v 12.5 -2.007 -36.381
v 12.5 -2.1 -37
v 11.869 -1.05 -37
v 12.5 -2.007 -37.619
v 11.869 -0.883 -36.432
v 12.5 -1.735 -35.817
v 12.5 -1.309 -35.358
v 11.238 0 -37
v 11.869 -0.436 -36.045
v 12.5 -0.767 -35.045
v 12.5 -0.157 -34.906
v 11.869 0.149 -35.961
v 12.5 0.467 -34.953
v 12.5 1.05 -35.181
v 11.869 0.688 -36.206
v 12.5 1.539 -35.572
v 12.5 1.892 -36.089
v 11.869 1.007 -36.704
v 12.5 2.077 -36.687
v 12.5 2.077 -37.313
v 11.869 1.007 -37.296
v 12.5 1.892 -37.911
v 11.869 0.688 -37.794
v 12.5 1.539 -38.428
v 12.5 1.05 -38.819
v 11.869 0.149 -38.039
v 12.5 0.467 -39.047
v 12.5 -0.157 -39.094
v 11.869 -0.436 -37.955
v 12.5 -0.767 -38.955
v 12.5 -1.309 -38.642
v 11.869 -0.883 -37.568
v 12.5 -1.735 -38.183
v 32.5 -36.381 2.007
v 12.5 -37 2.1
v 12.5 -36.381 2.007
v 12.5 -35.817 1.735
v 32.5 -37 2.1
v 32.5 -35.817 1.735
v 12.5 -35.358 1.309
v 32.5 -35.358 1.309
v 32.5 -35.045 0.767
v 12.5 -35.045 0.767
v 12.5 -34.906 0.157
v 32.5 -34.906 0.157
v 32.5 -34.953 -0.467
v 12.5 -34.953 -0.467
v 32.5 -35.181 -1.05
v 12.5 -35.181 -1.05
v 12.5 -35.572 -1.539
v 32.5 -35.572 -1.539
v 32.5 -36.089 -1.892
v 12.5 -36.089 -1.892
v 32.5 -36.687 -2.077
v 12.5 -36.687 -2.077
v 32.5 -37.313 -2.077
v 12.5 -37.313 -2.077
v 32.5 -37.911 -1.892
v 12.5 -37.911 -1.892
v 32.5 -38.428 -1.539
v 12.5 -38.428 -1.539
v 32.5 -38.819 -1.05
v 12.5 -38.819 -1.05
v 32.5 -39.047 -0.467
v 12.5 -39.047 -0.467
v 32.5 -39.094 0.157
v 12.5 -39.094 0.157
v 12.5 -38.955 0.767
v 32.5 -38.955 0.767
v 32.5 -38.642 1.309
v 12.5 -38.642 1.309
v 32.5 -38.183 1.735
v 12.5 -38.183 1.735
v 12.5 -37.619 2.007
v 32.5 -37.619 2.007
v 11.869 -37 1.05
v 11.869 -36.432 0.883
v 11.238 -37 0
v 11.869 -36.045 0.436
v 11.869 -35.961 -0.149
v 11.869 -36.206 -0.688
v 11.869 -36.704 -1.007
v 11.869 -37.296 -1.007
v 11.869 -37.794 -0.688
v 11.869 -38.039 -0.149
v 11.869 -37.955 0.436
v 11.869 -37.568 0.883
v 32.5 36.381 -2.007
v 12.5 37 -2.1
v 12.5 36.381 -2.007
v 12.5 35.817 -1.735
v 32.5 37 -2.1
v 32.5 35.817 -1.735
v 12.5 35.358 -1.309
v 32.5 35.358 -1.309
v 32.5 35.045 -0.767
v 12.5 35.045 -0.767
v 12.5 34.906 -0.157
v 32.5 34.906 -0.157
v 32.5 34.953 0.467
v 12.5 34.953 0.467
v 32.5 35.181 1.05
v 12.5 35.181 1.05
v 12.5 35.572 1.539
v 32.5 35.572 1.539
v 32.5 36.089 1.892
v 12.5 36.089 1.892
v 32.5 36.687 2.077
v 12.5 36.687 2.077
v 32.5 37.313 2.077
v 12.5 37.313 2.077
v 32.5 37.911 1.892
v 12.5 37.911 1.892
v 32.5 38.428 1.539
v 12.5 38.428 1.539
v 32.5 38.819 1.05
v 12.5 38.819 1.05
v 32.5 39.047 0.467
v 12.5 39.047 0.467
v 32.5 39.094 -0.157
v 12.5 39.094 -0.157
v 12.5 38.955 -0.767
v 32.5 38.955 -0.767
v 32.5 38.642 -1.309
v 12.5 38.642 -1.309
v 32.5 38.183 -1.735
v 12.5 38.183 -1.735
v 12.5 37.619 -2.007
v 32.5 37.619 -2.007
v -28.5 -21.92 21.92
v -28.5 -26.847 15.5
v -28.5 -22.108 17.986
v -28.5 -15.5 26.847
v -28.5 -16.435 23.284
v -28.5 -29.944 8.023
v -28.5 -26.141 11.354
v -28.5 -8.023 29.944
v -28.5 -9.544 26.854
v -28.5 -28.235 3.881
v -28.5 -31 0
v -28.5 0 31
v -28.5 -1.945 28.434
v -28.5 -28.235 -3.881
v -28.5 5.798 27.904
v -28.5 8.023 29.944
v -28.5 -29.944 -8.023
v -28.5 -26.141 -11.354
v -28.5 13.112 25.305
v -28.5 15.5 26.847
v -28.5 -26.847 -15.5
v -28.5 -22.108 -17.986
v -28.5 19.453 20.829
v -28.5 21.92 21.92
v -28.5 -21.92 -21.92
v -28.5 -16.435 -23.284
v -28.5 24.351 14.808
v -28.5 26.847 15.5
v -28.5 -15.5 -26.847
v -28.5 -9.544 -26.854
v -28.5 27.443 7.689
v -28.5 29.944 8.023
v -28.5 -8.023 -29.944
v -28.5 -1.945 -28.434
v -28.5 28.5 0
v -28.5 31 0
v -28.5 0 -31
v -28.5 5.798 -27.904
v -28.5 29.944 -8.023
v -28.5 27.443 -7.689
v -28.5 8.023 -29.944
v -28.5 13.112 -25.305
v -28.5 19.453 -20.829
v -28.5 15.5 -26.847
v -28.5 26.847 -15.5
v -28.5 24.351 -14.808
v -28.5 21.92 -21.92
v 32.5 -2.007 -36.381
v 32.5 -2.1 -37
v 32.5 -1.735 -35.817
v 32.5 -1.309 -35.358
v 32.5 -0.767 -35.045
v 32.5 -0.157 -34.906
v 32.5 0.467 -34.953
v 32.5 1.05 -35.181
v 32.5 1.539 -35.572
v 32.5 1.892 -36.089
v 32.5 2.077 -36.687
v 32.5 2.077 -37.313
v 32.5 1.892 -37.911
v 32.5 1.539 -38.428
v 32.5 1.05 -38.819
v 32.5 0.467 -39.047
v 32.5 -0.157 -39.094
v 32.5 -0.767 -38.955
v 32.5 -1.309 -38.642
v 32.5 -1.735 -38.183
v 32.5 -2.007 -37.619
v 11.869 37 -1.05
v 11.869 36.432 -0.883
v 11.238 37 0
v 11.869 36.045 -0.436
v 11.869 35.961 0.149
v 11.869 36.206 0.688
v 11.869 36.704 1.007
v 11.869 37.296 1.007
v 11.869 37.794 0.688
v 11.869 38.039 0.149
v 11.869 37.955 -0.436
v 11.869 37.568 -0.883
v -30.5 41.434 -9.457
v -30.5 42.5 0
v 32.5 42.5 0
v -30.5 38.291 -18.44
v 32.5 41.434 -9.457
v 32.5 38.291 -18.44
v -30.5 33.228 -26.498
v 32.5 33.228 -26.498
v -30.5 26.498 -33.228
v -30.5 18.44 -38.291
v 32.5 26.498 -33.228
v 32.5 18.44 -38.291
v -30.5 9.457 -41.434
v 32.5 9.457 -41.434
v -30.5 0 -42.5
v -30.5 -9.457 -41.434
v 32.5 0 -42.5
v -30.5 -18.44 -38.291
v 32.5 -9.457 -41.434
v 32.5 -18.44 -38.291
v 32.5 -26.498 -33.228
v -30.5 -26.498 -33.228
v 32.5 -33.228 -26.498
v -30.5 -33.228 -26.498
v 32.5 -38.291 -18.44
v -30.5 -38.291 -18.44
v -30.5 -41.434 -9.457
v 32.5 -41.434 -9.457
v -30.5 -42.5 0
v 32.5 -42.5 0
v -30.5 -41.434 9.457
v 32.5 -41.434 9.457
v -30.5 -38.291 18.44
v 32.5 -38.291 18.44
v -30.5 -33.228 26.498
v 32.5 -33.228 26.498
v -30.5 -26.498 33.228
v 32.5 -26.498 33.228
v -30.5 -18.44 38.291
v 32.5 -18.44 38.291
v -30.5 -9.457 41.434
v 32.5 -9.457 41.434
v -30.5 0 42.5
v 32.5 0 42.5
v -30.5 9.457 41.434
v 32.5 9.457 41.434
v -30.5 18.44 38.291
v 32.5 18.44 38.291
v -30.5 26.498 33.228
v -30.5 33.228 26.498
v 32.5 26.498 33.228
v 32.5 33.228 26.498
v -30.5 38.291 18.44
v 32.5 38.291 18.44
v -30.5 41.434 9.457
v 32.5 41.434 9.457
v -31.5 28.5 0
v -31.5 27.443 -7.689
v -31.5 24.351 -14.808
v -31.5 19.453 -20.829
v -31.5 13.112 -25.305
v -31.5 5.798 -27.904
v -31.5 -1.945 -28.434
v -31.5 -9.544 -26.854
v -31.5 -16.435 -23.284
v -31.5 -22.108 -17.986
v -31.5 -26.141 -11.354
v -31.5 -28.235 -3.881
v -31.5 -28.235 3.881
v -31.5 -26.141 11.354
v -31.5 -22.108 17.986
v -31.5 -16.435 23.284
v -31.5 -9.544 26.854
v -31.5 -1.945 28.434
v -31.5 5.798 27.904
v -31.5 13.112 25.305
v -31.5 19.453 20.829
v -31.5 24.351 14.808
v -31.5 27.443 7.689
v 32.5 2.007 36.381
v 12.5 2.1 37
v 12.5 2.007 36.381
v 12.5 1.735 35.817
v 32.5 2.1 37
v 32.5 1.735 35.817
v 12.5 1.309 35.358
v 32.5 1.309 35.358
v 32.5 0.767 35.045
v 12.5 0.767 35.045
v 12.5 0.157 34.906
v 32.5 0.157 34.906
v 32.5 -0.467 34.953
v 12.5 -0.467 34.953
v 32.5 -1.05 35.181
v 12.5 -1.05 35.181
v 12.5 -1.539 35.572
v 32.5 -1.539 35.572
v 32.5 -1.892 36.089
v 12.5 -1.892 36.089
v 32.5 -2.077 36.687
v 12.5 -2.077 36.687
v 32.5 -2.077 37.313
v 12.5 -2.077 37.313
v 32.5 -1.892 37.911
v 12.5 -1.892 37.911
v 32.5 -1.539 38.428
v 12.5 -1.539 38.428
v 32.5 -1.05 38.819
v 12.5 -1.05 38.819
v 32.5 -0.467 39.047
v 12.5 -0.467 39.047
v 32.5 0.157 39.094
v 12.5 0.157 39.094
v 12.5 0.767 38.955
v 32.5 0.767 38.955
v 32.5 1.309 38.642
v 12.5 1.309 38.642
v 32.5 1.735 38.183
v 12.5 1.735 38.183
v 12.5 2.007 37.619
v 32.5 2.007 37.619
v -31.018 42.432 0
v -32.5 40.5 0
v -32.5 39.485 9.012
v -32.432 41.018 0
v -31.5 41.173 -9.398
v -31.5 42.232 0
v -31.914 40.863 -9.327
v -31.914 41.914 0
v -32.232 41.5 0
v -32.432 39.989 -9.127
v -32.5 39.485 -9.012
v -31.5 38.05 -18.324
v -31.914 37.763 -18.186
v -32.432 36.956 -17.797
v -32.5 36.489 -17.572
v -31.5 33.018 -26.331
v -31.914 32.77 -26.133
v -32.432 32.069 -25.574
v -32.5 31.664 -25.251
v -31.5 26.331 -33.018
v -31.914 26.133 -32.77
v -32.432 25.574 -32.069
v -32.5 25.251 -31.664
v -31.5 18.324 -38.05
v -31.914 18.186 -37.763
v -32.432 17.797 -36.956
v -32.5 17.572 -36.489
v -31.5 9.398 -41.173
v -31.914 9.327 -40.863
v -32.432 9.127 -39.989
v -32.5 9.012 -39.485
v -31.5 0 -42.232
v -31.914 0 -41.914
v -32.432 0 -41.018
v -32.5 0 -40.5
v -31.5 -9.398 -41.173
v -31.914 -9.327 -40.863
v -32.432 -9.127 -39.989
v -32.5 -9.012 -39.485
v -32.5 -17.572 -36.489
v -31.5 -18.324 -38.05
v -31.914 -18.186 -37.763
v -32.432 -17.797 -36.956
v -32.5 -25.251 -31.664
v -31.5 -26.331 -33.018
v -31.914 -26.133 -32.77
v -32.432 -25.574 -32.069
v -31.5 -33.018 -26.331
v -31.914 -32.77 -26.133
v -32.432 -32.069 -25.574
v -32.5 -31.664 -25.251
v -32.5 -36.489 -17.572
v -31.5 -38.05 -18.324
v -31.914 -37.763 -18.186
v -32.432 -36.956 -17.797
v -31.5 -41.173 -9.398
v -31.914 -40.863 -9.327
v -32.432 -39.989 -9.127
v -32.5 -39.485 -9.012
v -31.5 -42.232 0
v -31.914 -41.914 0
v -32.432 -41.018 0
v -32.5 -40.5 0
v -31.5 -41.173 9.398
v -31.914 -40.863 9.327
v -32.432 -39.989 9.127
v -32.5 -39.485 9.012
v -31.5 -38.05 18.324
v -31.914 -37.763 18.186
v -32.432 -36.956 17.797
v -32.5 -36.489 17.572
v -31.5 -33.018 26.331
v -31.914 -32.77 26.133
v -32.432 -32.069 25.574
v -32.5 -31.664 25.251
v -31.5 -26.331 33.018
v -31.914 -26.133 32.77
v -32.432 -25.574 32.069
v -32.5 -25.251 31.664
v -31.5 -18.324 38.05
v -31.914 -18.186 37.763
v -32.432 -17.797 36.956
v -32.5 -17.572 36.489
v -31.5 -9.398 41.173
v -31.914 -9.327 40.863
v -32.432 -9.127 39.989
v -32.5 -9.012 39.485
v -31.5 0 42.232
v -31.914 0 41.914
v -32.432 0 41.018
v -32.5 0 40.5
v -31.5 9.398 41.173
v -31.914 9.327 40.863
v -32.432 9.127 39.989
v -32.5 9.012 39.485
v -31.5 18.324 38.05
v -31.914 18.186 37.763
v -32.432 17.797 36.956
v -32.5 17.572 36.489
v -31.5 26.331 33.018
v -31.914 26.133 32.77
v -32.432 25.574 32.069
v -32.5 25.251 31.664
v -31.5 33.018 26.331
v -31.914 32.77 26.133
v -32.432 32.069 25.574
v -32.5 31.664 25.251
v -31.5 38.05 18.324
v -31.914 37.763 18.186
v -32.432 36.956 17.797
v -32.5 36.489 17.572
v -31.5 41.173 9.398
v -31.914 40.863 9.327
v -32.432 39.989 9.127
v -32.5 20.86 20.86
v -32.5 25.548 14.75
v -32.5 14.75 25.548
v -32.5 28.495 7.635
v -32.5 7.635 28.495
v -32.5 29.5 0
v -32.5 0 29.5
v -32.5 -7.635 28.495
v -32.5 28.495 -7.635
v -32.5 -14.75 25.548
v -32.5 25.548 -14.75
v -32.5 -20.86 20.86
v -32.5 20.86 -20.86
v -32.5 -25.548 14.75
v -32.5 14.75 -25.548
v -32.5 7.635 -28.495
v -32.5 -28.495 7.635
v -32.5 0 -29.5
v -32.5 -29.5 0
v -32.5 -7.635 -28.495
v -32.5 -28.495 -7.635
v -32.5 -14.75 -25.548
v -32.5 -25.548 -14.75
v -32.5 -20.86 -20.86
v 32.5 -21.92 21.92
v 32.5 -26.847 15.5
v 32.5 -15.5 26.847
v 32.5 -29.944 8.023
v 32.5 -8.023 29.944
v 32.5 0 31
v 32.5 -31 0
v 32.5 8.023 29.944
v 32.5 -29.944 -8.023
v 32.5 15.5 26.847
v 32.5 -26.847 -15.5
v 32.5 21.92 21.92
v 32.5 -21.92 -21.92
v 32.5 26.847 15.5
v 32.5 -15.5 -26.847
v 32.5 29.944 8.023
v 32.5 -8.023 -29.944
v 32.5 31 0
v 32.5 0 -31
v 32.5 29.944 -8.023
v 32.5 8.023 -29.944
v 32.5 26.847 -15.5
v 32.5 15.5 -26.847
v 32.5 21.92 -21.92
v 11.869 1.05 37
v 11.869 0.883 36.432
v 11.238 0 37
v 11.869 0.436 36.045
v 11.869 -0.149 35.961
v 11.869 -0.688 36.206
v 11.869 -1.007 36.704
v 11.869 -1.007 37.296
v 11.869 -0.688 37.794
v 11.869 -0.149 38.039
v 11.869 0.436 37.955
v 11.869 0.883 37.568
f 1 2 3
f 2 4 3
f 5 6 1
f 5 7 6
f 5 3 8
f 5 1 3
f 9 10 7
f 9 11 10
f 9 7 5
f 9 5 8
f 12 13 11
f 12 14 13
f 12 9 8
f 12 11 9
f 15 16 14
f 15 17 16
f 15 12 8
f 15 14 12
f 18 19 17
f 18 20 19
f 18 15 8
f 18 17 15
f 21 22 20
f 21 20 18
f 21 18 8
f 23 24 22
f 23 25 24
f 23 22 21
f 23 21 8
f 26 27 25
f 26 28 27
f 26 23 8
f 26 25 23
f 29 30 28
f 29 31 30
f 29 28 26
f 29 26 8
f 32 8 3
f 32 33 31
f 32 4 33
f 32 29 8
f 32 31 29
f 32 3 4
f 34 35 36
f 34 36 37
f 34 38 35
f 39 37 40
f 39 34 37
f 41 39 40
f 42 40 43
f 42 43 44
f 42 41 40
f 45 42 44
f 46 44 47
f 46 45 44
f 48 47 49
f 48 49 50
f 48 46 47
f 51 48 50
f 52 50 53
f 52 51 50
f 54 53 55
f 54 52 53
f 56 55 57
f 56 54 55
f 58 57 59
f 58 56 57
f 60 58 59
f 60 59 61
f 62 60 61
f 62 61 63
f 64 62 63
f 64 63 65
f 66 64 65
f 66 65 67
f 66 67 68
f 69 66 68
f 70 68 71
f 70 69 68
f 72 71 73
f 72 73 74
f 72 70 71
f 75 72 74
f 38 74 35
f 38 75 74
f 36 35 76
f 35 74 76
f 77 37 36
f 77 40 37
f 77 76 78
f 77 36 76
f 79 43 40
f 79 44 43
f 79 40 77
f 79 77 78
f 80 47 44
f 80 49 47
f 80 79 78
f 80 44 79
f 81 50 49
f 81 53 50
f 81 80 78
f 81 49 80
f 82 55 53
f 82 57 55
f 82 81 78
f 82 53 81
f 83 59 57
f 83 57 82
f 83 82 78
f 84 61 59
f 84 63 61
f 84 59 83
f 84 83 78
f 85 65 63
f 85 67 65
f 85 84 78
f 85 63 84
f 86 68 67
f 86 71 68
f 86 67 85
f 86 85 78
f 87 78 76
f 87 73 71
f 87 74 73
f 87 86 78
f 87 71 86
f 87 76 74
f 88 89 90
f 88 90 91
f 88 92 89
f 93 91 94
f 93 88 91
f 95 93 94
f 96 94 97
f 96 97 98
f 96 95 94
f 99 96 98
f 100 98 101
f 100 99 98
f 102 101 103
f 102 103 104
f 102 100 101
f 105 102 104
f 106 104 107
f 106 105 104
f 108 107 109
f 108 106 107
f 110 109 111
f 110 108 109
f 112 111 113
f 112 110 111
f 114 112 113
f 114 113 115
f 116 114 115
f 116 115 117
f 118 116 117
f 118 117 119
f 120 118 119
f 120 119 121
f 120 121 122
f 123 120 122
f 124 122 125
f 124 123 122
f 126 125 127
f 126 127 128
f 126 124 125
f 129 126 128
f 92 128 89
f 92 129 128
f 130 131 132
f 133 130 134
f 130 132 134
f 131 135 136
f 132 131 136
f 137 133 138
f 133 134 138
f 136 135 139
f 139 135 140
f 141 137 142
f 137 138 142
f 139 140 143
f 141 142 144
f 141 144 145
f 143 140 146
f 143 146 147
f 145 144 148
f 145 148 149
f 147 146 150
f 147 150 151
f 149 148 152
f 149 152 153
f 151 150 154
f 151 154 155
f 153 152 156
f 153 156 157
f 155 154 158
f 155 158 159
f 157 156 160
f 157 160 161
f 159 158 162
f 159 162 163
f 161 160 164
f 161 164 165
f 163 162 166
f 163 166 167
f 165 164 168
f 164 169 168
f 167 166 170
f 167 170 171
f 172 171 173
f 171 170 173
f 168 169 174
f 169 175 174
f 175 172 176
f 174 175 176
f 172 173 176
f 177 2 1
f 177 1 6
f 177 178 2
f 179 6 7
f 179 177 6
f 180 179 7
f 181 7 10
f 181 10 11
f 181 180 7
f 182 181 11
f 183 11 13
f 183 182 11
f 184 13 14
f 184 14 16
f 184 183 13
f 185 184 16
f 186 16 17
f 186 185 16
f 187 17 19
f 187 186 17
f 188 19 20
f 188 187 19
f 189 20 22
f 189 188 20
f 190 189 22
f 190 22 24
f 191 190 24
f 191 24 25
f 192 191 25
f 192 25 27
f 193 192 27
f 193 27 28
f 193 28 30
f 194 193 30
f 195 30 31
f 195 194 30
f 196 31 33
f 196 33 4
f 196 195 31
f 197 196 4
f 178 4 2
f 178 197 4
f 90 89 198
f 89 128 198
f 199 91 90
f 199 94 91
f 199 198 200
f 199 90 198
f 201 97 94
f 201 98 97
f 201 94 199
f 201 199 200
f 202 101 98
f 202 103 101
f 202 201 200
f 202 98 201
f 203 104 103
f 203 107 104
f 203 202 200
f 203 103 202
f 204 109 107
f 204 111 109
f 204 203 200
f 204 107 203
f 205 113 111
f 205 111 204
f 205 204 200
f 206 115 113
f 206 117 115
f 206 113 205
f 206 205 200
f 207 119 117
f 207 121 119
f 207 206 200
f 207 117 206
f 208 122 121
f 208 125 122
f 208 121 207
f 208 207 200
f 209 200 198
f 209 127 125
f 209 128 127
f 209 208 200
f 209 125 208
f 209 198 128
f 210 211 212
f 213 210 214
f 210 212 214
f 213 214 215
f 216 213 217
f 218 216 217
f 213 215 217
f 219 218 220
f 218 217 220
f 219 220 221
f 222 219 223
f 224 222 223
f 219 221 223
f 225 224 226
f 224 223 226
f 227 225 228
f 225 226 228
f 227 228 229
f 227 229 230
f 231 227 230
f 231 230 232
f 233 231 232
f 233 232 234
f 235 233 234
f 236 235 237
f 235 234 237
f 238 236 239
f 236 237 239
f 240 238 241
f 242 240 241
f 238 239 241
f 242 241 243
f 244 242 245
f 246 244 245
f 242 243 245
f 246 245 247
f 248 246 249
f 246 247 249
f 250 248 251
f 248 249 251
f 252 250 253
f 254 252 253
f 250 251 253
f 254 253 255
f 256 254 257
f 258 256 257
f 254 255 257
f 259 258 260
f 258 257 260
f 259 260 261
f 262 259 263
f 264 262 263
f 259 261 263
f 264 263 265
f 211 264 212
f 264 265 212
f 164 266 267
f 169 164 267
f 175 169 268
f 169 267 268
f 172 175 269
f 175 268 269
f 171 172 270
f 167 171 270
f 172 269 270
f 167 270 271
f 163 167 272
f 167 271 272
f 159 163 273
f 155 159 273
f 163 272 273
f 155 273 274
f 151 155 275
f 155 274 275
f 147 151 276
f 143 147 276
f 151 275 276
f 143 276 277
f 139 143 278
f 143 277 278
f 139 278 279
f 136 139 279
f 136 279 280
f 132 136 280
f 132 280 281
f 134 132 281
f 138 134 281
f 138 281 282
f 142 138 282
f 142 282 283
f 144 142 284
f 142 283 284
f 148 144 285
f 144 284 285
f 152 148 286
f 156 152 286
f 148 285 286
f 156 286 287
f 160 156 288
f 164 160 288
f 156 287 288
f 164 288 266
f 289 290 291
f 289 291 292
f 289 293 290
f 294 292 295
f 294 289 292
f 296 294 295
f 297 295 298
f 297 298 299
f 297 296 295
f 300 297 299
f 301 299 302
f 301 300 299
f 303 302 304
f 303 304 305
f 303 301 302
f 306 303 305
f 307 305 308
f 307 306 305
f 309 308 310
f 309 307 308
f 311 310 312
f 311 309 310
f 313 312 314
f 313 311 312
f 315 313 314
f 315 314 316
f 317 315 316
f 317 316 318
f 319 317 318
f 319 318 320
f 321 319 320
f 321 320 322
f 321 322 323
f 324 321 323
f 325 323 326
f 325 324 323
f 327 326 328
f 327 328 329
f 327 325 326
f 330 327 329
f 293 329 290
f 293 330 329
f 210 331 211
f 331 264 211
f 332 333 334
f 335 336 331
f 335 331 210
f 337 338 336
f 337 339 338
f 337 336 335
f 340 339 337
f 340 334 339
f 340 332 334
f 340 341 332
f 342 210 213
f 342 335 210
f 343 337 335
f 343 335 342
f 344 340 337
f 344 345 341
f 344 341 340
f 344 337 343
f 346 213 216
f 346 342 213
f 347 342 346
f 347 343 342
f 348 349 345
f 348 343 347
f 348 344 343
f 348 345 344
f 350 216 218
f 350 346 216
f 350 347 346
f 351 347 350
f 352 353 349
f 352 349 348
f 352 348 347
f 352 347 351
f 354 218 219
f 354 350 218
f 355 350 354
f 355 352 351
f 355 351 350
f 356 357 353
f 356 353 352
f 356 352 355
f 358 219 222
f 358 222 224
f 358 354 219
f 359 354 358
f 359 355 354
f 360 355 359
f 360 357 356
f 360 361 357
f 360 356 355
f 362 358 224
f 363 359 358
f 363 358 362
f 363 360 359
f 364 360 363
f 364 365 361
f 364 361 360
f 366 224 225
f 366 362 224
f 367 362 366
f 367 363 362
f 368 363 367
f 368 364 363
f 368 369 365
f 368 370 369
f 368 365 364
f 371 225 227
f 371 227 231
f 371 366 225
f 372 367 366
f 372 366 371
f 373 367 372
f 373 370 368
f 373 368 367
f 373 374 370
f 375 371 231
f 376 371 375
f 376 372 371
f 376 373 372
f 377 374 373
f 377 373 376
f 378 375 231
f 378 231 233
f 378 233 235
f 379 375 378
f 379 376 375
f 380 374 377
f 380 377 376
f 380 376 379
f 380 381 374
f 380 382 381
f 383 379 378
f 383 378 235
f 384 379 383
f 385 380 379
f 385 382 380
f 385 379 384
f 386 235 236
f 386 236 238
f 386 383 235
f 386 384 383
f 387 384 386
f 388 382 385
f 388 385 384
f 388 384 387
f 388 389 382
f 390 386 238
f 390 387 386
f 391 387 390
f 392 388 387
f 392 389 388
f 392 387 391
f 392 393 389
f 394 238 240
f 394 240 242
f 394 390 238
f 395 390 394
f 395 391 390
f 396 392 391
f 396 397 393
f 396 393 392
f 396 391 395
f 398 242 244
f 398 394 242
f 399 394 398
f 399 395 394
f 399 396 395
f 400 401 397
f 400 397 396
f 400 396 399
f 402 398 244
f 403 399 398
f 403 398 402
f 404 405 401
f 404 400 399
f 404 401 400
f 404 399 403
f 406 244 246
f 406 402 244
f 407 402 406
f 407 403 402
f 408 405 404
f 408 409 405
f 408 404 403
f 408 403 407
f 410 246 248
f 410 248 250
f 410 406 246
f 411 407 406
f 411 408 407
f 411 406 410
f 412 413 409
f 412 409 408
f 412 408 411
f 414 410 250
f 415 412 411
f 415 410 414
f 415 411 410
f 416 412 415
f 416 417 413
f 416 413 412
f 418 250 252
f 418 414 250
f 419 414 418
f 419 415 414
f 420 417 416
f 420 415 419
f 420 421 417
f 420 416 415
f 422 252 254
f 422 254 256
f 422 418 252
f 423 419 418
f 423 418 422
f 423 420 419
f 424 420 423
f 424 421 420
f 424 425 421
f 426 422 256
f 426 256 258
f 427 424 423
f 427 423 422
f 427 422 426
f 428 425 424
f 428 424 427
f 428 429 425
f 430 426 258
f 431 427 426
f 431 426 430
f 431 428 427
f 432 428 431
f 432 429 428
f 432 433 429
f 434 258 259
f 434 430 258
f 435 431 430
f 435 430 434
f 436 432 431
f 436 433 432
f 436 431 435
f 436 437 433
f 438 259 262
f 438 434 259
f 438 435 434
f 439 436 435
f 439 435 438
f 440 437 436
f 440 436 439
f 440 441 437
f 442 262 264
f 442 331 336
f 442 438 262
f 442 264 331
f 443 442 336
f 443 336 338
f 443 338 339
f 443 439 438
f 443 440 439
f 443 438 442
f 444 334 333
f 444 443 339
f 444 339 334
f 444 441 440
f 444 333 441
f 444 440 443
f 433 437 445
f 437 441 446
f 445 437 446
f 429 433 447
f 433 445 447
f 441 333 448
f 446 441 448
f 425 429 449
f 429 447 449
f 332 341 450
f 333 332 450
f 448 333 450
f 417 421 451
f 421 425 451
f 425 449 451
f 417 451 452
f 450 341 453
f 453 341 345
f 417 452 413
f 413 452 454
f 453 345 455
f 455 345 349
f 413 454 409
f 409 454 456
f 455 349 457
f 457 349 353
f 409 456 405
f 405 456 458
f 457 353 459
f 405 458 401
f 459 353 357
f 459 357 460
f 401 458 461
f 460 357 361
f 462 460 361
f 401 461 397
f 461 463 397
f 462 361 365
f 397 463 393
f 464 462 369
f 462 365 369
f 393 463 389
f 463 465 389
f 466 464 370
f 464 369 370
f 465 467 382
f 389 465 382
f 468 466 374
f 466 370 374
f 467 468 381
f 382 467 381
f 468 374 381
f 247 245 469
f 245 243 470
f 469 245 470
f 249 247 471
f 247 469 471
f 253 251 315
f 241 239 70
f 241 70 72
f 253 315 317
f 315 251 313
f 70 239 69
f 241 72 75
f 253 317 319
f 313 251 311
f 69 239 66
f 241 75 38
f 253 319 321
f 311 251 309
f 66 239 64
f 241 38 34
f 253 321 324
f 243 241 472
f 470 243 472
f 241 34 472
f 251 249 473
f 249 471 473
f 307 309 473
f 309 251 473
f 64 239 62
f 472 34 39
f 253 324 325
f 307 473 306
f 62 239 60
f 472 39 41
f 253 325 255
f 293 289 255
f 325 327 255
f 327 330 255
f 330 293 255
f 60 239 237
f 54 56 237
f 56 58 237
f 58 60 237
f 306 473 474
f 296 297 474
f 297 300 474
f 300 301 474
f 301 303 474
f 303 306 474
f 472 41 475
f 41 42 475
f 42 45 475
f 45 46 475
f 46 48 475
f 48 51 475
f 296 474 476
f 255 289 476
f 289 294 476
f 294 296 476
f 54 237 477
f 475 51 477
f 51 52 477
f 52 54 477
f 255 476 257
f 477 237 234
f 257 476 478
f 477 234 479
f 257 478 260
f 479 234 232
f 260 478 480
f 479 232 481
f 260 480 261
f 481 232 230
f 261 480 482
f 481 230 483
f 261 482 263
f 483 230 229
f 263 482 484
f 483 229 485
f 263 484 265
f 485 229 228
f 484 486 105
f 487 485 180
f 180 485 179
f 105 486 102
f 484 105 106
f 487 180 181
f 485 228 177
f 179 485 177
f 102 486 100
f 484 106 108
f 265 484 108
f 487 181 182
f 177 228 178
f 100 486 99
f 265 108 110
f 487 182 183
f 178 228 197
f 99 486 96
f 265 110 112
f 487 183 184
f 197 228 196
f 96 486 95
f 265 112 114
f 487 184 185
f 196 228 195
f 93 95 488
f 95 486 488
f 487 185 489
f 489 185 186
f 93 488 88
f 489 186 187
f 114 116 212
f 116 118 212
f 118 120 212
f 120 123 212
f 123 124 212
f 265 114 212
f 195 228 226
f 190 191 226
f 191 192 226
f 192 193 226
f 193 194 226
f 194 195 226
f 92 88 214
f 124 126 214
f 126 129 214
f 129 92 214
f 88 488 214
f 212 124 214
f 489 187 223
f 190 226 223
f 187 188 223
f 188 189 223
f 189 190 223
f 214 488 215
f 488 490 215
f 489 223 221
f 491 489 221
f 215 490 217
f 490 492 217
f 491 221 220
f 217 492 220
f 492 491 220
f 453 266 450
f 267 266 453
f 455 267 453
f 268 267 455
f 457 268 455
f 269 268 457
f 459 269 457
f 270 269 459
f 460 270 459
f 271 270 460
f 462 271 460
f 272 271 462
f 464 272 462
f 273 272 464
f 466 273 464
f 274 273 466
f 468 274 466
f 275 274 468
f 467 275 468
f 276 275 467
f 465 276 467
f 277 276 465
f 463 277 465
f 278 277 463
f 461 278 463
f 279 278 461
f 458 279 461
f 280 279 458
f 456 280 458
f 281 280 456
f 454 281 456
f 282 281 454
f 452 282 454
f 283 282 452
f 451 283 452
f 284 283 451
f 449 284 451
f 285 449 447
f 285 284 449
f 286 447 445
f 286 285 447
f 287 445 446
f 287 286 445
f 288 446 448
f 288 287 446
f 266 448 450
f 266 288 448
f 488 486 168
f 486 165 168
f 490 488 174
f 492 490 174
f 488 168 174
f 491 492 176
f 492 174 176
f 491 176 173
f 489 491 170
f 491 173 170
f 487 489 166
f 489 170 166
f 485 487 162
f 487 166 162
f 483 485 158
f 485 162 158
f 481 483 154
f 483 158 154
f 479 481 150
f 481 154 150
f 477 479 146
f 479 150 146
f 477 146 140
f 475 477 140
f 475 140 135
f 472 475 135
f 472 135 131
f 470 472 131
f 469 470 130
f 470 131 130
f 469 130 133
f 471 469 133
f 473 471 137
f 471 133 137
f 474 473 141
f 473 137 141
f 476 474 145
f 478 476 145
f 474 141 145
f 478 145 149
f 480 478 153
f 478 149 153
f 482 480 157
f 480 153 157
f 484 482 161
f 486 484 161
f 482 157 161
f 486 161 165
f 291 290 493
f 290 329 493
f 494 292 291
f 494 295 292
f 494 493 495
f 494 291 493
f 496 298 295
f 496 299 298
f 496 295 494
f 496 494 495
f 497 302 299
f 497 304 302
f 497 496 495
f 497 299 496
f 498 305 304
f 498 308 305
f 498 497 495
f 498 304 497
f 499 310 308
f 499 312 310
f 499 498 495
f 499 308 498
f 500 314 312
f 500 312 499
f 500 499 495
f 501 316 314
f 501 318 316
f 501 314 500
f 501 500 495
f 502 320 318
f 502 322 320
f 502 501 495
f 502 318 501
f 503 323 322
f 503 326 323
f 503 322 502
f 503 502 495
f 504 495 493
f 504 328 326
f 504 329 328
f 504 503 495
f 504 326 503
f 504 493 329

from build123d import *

# Parameters (mm, degrees)
FILLET1_R         = 2
CHAMFER1_SIZE     = 1
CIRPATTERN1_COUNT = 4


with BuildPart() as part:
    # Sketch1 → Revolve1 (revolve)
    with BuildSketch(Plane.XY):
        Polygon((-32.5, 42.5), (32.5, 42.5), (32.5, 31), (-28.5, 31), (-28.5, 28.5), (-32.5, 28.5), align=None)
    revolve(axis=Axis((88.99, 0, 0), (-1, 0, 0)))

    # Fillet1
    fillet1_edges = [part.edges().sort_by_distance(p)[0] for p in [
        (-32.5, -42.5, 0),
    ]]
    fillet(fillet1_edges, radius=FILLET1_R)

    # Chamfer1
    chamfer1_edges = [part.edges().sort_by_distance(p)[0] for p in [
        (-32.5, -28.5, 0),
    ]]
    chamfer(chamfer1_edges, length=CHAMFER1_SIZE)

    # Sketch5 → Tap Drill for M5x0.8 Tap1 (revolve, cut)
    with BuildSketch(Plane(origin=(32.5, 37, 0), x_dir=(0, 0, -1), z_dir=(0, 1, 0))):
        Polygon((0, 0), (0, 21.2618073), (2.1, 20), (2.1, 0), align=None)
    tap_drill_for_m5x0_8_tap1 = revolve(axis=Axis((38.85, 37, 0), (-1, 0, 0)), mode=Mode.SUBTRACT)

    # CirPattern1: Tap Drill for M5x0.8 Tap1 ×4 about axis
    cirpattern1_axis = Axis((88.99, 0, 0), (-1, 0, 0))
    for i in range(1, CIRPATTERN1_COUNT):
        add(tap_drill_for_m5x0_8_tap1.rotate(cirpattern1_axis, i * 360 / CIRPATTERN1_COUNT), mode=Mode.SUBTRACT)


solid = part.part
